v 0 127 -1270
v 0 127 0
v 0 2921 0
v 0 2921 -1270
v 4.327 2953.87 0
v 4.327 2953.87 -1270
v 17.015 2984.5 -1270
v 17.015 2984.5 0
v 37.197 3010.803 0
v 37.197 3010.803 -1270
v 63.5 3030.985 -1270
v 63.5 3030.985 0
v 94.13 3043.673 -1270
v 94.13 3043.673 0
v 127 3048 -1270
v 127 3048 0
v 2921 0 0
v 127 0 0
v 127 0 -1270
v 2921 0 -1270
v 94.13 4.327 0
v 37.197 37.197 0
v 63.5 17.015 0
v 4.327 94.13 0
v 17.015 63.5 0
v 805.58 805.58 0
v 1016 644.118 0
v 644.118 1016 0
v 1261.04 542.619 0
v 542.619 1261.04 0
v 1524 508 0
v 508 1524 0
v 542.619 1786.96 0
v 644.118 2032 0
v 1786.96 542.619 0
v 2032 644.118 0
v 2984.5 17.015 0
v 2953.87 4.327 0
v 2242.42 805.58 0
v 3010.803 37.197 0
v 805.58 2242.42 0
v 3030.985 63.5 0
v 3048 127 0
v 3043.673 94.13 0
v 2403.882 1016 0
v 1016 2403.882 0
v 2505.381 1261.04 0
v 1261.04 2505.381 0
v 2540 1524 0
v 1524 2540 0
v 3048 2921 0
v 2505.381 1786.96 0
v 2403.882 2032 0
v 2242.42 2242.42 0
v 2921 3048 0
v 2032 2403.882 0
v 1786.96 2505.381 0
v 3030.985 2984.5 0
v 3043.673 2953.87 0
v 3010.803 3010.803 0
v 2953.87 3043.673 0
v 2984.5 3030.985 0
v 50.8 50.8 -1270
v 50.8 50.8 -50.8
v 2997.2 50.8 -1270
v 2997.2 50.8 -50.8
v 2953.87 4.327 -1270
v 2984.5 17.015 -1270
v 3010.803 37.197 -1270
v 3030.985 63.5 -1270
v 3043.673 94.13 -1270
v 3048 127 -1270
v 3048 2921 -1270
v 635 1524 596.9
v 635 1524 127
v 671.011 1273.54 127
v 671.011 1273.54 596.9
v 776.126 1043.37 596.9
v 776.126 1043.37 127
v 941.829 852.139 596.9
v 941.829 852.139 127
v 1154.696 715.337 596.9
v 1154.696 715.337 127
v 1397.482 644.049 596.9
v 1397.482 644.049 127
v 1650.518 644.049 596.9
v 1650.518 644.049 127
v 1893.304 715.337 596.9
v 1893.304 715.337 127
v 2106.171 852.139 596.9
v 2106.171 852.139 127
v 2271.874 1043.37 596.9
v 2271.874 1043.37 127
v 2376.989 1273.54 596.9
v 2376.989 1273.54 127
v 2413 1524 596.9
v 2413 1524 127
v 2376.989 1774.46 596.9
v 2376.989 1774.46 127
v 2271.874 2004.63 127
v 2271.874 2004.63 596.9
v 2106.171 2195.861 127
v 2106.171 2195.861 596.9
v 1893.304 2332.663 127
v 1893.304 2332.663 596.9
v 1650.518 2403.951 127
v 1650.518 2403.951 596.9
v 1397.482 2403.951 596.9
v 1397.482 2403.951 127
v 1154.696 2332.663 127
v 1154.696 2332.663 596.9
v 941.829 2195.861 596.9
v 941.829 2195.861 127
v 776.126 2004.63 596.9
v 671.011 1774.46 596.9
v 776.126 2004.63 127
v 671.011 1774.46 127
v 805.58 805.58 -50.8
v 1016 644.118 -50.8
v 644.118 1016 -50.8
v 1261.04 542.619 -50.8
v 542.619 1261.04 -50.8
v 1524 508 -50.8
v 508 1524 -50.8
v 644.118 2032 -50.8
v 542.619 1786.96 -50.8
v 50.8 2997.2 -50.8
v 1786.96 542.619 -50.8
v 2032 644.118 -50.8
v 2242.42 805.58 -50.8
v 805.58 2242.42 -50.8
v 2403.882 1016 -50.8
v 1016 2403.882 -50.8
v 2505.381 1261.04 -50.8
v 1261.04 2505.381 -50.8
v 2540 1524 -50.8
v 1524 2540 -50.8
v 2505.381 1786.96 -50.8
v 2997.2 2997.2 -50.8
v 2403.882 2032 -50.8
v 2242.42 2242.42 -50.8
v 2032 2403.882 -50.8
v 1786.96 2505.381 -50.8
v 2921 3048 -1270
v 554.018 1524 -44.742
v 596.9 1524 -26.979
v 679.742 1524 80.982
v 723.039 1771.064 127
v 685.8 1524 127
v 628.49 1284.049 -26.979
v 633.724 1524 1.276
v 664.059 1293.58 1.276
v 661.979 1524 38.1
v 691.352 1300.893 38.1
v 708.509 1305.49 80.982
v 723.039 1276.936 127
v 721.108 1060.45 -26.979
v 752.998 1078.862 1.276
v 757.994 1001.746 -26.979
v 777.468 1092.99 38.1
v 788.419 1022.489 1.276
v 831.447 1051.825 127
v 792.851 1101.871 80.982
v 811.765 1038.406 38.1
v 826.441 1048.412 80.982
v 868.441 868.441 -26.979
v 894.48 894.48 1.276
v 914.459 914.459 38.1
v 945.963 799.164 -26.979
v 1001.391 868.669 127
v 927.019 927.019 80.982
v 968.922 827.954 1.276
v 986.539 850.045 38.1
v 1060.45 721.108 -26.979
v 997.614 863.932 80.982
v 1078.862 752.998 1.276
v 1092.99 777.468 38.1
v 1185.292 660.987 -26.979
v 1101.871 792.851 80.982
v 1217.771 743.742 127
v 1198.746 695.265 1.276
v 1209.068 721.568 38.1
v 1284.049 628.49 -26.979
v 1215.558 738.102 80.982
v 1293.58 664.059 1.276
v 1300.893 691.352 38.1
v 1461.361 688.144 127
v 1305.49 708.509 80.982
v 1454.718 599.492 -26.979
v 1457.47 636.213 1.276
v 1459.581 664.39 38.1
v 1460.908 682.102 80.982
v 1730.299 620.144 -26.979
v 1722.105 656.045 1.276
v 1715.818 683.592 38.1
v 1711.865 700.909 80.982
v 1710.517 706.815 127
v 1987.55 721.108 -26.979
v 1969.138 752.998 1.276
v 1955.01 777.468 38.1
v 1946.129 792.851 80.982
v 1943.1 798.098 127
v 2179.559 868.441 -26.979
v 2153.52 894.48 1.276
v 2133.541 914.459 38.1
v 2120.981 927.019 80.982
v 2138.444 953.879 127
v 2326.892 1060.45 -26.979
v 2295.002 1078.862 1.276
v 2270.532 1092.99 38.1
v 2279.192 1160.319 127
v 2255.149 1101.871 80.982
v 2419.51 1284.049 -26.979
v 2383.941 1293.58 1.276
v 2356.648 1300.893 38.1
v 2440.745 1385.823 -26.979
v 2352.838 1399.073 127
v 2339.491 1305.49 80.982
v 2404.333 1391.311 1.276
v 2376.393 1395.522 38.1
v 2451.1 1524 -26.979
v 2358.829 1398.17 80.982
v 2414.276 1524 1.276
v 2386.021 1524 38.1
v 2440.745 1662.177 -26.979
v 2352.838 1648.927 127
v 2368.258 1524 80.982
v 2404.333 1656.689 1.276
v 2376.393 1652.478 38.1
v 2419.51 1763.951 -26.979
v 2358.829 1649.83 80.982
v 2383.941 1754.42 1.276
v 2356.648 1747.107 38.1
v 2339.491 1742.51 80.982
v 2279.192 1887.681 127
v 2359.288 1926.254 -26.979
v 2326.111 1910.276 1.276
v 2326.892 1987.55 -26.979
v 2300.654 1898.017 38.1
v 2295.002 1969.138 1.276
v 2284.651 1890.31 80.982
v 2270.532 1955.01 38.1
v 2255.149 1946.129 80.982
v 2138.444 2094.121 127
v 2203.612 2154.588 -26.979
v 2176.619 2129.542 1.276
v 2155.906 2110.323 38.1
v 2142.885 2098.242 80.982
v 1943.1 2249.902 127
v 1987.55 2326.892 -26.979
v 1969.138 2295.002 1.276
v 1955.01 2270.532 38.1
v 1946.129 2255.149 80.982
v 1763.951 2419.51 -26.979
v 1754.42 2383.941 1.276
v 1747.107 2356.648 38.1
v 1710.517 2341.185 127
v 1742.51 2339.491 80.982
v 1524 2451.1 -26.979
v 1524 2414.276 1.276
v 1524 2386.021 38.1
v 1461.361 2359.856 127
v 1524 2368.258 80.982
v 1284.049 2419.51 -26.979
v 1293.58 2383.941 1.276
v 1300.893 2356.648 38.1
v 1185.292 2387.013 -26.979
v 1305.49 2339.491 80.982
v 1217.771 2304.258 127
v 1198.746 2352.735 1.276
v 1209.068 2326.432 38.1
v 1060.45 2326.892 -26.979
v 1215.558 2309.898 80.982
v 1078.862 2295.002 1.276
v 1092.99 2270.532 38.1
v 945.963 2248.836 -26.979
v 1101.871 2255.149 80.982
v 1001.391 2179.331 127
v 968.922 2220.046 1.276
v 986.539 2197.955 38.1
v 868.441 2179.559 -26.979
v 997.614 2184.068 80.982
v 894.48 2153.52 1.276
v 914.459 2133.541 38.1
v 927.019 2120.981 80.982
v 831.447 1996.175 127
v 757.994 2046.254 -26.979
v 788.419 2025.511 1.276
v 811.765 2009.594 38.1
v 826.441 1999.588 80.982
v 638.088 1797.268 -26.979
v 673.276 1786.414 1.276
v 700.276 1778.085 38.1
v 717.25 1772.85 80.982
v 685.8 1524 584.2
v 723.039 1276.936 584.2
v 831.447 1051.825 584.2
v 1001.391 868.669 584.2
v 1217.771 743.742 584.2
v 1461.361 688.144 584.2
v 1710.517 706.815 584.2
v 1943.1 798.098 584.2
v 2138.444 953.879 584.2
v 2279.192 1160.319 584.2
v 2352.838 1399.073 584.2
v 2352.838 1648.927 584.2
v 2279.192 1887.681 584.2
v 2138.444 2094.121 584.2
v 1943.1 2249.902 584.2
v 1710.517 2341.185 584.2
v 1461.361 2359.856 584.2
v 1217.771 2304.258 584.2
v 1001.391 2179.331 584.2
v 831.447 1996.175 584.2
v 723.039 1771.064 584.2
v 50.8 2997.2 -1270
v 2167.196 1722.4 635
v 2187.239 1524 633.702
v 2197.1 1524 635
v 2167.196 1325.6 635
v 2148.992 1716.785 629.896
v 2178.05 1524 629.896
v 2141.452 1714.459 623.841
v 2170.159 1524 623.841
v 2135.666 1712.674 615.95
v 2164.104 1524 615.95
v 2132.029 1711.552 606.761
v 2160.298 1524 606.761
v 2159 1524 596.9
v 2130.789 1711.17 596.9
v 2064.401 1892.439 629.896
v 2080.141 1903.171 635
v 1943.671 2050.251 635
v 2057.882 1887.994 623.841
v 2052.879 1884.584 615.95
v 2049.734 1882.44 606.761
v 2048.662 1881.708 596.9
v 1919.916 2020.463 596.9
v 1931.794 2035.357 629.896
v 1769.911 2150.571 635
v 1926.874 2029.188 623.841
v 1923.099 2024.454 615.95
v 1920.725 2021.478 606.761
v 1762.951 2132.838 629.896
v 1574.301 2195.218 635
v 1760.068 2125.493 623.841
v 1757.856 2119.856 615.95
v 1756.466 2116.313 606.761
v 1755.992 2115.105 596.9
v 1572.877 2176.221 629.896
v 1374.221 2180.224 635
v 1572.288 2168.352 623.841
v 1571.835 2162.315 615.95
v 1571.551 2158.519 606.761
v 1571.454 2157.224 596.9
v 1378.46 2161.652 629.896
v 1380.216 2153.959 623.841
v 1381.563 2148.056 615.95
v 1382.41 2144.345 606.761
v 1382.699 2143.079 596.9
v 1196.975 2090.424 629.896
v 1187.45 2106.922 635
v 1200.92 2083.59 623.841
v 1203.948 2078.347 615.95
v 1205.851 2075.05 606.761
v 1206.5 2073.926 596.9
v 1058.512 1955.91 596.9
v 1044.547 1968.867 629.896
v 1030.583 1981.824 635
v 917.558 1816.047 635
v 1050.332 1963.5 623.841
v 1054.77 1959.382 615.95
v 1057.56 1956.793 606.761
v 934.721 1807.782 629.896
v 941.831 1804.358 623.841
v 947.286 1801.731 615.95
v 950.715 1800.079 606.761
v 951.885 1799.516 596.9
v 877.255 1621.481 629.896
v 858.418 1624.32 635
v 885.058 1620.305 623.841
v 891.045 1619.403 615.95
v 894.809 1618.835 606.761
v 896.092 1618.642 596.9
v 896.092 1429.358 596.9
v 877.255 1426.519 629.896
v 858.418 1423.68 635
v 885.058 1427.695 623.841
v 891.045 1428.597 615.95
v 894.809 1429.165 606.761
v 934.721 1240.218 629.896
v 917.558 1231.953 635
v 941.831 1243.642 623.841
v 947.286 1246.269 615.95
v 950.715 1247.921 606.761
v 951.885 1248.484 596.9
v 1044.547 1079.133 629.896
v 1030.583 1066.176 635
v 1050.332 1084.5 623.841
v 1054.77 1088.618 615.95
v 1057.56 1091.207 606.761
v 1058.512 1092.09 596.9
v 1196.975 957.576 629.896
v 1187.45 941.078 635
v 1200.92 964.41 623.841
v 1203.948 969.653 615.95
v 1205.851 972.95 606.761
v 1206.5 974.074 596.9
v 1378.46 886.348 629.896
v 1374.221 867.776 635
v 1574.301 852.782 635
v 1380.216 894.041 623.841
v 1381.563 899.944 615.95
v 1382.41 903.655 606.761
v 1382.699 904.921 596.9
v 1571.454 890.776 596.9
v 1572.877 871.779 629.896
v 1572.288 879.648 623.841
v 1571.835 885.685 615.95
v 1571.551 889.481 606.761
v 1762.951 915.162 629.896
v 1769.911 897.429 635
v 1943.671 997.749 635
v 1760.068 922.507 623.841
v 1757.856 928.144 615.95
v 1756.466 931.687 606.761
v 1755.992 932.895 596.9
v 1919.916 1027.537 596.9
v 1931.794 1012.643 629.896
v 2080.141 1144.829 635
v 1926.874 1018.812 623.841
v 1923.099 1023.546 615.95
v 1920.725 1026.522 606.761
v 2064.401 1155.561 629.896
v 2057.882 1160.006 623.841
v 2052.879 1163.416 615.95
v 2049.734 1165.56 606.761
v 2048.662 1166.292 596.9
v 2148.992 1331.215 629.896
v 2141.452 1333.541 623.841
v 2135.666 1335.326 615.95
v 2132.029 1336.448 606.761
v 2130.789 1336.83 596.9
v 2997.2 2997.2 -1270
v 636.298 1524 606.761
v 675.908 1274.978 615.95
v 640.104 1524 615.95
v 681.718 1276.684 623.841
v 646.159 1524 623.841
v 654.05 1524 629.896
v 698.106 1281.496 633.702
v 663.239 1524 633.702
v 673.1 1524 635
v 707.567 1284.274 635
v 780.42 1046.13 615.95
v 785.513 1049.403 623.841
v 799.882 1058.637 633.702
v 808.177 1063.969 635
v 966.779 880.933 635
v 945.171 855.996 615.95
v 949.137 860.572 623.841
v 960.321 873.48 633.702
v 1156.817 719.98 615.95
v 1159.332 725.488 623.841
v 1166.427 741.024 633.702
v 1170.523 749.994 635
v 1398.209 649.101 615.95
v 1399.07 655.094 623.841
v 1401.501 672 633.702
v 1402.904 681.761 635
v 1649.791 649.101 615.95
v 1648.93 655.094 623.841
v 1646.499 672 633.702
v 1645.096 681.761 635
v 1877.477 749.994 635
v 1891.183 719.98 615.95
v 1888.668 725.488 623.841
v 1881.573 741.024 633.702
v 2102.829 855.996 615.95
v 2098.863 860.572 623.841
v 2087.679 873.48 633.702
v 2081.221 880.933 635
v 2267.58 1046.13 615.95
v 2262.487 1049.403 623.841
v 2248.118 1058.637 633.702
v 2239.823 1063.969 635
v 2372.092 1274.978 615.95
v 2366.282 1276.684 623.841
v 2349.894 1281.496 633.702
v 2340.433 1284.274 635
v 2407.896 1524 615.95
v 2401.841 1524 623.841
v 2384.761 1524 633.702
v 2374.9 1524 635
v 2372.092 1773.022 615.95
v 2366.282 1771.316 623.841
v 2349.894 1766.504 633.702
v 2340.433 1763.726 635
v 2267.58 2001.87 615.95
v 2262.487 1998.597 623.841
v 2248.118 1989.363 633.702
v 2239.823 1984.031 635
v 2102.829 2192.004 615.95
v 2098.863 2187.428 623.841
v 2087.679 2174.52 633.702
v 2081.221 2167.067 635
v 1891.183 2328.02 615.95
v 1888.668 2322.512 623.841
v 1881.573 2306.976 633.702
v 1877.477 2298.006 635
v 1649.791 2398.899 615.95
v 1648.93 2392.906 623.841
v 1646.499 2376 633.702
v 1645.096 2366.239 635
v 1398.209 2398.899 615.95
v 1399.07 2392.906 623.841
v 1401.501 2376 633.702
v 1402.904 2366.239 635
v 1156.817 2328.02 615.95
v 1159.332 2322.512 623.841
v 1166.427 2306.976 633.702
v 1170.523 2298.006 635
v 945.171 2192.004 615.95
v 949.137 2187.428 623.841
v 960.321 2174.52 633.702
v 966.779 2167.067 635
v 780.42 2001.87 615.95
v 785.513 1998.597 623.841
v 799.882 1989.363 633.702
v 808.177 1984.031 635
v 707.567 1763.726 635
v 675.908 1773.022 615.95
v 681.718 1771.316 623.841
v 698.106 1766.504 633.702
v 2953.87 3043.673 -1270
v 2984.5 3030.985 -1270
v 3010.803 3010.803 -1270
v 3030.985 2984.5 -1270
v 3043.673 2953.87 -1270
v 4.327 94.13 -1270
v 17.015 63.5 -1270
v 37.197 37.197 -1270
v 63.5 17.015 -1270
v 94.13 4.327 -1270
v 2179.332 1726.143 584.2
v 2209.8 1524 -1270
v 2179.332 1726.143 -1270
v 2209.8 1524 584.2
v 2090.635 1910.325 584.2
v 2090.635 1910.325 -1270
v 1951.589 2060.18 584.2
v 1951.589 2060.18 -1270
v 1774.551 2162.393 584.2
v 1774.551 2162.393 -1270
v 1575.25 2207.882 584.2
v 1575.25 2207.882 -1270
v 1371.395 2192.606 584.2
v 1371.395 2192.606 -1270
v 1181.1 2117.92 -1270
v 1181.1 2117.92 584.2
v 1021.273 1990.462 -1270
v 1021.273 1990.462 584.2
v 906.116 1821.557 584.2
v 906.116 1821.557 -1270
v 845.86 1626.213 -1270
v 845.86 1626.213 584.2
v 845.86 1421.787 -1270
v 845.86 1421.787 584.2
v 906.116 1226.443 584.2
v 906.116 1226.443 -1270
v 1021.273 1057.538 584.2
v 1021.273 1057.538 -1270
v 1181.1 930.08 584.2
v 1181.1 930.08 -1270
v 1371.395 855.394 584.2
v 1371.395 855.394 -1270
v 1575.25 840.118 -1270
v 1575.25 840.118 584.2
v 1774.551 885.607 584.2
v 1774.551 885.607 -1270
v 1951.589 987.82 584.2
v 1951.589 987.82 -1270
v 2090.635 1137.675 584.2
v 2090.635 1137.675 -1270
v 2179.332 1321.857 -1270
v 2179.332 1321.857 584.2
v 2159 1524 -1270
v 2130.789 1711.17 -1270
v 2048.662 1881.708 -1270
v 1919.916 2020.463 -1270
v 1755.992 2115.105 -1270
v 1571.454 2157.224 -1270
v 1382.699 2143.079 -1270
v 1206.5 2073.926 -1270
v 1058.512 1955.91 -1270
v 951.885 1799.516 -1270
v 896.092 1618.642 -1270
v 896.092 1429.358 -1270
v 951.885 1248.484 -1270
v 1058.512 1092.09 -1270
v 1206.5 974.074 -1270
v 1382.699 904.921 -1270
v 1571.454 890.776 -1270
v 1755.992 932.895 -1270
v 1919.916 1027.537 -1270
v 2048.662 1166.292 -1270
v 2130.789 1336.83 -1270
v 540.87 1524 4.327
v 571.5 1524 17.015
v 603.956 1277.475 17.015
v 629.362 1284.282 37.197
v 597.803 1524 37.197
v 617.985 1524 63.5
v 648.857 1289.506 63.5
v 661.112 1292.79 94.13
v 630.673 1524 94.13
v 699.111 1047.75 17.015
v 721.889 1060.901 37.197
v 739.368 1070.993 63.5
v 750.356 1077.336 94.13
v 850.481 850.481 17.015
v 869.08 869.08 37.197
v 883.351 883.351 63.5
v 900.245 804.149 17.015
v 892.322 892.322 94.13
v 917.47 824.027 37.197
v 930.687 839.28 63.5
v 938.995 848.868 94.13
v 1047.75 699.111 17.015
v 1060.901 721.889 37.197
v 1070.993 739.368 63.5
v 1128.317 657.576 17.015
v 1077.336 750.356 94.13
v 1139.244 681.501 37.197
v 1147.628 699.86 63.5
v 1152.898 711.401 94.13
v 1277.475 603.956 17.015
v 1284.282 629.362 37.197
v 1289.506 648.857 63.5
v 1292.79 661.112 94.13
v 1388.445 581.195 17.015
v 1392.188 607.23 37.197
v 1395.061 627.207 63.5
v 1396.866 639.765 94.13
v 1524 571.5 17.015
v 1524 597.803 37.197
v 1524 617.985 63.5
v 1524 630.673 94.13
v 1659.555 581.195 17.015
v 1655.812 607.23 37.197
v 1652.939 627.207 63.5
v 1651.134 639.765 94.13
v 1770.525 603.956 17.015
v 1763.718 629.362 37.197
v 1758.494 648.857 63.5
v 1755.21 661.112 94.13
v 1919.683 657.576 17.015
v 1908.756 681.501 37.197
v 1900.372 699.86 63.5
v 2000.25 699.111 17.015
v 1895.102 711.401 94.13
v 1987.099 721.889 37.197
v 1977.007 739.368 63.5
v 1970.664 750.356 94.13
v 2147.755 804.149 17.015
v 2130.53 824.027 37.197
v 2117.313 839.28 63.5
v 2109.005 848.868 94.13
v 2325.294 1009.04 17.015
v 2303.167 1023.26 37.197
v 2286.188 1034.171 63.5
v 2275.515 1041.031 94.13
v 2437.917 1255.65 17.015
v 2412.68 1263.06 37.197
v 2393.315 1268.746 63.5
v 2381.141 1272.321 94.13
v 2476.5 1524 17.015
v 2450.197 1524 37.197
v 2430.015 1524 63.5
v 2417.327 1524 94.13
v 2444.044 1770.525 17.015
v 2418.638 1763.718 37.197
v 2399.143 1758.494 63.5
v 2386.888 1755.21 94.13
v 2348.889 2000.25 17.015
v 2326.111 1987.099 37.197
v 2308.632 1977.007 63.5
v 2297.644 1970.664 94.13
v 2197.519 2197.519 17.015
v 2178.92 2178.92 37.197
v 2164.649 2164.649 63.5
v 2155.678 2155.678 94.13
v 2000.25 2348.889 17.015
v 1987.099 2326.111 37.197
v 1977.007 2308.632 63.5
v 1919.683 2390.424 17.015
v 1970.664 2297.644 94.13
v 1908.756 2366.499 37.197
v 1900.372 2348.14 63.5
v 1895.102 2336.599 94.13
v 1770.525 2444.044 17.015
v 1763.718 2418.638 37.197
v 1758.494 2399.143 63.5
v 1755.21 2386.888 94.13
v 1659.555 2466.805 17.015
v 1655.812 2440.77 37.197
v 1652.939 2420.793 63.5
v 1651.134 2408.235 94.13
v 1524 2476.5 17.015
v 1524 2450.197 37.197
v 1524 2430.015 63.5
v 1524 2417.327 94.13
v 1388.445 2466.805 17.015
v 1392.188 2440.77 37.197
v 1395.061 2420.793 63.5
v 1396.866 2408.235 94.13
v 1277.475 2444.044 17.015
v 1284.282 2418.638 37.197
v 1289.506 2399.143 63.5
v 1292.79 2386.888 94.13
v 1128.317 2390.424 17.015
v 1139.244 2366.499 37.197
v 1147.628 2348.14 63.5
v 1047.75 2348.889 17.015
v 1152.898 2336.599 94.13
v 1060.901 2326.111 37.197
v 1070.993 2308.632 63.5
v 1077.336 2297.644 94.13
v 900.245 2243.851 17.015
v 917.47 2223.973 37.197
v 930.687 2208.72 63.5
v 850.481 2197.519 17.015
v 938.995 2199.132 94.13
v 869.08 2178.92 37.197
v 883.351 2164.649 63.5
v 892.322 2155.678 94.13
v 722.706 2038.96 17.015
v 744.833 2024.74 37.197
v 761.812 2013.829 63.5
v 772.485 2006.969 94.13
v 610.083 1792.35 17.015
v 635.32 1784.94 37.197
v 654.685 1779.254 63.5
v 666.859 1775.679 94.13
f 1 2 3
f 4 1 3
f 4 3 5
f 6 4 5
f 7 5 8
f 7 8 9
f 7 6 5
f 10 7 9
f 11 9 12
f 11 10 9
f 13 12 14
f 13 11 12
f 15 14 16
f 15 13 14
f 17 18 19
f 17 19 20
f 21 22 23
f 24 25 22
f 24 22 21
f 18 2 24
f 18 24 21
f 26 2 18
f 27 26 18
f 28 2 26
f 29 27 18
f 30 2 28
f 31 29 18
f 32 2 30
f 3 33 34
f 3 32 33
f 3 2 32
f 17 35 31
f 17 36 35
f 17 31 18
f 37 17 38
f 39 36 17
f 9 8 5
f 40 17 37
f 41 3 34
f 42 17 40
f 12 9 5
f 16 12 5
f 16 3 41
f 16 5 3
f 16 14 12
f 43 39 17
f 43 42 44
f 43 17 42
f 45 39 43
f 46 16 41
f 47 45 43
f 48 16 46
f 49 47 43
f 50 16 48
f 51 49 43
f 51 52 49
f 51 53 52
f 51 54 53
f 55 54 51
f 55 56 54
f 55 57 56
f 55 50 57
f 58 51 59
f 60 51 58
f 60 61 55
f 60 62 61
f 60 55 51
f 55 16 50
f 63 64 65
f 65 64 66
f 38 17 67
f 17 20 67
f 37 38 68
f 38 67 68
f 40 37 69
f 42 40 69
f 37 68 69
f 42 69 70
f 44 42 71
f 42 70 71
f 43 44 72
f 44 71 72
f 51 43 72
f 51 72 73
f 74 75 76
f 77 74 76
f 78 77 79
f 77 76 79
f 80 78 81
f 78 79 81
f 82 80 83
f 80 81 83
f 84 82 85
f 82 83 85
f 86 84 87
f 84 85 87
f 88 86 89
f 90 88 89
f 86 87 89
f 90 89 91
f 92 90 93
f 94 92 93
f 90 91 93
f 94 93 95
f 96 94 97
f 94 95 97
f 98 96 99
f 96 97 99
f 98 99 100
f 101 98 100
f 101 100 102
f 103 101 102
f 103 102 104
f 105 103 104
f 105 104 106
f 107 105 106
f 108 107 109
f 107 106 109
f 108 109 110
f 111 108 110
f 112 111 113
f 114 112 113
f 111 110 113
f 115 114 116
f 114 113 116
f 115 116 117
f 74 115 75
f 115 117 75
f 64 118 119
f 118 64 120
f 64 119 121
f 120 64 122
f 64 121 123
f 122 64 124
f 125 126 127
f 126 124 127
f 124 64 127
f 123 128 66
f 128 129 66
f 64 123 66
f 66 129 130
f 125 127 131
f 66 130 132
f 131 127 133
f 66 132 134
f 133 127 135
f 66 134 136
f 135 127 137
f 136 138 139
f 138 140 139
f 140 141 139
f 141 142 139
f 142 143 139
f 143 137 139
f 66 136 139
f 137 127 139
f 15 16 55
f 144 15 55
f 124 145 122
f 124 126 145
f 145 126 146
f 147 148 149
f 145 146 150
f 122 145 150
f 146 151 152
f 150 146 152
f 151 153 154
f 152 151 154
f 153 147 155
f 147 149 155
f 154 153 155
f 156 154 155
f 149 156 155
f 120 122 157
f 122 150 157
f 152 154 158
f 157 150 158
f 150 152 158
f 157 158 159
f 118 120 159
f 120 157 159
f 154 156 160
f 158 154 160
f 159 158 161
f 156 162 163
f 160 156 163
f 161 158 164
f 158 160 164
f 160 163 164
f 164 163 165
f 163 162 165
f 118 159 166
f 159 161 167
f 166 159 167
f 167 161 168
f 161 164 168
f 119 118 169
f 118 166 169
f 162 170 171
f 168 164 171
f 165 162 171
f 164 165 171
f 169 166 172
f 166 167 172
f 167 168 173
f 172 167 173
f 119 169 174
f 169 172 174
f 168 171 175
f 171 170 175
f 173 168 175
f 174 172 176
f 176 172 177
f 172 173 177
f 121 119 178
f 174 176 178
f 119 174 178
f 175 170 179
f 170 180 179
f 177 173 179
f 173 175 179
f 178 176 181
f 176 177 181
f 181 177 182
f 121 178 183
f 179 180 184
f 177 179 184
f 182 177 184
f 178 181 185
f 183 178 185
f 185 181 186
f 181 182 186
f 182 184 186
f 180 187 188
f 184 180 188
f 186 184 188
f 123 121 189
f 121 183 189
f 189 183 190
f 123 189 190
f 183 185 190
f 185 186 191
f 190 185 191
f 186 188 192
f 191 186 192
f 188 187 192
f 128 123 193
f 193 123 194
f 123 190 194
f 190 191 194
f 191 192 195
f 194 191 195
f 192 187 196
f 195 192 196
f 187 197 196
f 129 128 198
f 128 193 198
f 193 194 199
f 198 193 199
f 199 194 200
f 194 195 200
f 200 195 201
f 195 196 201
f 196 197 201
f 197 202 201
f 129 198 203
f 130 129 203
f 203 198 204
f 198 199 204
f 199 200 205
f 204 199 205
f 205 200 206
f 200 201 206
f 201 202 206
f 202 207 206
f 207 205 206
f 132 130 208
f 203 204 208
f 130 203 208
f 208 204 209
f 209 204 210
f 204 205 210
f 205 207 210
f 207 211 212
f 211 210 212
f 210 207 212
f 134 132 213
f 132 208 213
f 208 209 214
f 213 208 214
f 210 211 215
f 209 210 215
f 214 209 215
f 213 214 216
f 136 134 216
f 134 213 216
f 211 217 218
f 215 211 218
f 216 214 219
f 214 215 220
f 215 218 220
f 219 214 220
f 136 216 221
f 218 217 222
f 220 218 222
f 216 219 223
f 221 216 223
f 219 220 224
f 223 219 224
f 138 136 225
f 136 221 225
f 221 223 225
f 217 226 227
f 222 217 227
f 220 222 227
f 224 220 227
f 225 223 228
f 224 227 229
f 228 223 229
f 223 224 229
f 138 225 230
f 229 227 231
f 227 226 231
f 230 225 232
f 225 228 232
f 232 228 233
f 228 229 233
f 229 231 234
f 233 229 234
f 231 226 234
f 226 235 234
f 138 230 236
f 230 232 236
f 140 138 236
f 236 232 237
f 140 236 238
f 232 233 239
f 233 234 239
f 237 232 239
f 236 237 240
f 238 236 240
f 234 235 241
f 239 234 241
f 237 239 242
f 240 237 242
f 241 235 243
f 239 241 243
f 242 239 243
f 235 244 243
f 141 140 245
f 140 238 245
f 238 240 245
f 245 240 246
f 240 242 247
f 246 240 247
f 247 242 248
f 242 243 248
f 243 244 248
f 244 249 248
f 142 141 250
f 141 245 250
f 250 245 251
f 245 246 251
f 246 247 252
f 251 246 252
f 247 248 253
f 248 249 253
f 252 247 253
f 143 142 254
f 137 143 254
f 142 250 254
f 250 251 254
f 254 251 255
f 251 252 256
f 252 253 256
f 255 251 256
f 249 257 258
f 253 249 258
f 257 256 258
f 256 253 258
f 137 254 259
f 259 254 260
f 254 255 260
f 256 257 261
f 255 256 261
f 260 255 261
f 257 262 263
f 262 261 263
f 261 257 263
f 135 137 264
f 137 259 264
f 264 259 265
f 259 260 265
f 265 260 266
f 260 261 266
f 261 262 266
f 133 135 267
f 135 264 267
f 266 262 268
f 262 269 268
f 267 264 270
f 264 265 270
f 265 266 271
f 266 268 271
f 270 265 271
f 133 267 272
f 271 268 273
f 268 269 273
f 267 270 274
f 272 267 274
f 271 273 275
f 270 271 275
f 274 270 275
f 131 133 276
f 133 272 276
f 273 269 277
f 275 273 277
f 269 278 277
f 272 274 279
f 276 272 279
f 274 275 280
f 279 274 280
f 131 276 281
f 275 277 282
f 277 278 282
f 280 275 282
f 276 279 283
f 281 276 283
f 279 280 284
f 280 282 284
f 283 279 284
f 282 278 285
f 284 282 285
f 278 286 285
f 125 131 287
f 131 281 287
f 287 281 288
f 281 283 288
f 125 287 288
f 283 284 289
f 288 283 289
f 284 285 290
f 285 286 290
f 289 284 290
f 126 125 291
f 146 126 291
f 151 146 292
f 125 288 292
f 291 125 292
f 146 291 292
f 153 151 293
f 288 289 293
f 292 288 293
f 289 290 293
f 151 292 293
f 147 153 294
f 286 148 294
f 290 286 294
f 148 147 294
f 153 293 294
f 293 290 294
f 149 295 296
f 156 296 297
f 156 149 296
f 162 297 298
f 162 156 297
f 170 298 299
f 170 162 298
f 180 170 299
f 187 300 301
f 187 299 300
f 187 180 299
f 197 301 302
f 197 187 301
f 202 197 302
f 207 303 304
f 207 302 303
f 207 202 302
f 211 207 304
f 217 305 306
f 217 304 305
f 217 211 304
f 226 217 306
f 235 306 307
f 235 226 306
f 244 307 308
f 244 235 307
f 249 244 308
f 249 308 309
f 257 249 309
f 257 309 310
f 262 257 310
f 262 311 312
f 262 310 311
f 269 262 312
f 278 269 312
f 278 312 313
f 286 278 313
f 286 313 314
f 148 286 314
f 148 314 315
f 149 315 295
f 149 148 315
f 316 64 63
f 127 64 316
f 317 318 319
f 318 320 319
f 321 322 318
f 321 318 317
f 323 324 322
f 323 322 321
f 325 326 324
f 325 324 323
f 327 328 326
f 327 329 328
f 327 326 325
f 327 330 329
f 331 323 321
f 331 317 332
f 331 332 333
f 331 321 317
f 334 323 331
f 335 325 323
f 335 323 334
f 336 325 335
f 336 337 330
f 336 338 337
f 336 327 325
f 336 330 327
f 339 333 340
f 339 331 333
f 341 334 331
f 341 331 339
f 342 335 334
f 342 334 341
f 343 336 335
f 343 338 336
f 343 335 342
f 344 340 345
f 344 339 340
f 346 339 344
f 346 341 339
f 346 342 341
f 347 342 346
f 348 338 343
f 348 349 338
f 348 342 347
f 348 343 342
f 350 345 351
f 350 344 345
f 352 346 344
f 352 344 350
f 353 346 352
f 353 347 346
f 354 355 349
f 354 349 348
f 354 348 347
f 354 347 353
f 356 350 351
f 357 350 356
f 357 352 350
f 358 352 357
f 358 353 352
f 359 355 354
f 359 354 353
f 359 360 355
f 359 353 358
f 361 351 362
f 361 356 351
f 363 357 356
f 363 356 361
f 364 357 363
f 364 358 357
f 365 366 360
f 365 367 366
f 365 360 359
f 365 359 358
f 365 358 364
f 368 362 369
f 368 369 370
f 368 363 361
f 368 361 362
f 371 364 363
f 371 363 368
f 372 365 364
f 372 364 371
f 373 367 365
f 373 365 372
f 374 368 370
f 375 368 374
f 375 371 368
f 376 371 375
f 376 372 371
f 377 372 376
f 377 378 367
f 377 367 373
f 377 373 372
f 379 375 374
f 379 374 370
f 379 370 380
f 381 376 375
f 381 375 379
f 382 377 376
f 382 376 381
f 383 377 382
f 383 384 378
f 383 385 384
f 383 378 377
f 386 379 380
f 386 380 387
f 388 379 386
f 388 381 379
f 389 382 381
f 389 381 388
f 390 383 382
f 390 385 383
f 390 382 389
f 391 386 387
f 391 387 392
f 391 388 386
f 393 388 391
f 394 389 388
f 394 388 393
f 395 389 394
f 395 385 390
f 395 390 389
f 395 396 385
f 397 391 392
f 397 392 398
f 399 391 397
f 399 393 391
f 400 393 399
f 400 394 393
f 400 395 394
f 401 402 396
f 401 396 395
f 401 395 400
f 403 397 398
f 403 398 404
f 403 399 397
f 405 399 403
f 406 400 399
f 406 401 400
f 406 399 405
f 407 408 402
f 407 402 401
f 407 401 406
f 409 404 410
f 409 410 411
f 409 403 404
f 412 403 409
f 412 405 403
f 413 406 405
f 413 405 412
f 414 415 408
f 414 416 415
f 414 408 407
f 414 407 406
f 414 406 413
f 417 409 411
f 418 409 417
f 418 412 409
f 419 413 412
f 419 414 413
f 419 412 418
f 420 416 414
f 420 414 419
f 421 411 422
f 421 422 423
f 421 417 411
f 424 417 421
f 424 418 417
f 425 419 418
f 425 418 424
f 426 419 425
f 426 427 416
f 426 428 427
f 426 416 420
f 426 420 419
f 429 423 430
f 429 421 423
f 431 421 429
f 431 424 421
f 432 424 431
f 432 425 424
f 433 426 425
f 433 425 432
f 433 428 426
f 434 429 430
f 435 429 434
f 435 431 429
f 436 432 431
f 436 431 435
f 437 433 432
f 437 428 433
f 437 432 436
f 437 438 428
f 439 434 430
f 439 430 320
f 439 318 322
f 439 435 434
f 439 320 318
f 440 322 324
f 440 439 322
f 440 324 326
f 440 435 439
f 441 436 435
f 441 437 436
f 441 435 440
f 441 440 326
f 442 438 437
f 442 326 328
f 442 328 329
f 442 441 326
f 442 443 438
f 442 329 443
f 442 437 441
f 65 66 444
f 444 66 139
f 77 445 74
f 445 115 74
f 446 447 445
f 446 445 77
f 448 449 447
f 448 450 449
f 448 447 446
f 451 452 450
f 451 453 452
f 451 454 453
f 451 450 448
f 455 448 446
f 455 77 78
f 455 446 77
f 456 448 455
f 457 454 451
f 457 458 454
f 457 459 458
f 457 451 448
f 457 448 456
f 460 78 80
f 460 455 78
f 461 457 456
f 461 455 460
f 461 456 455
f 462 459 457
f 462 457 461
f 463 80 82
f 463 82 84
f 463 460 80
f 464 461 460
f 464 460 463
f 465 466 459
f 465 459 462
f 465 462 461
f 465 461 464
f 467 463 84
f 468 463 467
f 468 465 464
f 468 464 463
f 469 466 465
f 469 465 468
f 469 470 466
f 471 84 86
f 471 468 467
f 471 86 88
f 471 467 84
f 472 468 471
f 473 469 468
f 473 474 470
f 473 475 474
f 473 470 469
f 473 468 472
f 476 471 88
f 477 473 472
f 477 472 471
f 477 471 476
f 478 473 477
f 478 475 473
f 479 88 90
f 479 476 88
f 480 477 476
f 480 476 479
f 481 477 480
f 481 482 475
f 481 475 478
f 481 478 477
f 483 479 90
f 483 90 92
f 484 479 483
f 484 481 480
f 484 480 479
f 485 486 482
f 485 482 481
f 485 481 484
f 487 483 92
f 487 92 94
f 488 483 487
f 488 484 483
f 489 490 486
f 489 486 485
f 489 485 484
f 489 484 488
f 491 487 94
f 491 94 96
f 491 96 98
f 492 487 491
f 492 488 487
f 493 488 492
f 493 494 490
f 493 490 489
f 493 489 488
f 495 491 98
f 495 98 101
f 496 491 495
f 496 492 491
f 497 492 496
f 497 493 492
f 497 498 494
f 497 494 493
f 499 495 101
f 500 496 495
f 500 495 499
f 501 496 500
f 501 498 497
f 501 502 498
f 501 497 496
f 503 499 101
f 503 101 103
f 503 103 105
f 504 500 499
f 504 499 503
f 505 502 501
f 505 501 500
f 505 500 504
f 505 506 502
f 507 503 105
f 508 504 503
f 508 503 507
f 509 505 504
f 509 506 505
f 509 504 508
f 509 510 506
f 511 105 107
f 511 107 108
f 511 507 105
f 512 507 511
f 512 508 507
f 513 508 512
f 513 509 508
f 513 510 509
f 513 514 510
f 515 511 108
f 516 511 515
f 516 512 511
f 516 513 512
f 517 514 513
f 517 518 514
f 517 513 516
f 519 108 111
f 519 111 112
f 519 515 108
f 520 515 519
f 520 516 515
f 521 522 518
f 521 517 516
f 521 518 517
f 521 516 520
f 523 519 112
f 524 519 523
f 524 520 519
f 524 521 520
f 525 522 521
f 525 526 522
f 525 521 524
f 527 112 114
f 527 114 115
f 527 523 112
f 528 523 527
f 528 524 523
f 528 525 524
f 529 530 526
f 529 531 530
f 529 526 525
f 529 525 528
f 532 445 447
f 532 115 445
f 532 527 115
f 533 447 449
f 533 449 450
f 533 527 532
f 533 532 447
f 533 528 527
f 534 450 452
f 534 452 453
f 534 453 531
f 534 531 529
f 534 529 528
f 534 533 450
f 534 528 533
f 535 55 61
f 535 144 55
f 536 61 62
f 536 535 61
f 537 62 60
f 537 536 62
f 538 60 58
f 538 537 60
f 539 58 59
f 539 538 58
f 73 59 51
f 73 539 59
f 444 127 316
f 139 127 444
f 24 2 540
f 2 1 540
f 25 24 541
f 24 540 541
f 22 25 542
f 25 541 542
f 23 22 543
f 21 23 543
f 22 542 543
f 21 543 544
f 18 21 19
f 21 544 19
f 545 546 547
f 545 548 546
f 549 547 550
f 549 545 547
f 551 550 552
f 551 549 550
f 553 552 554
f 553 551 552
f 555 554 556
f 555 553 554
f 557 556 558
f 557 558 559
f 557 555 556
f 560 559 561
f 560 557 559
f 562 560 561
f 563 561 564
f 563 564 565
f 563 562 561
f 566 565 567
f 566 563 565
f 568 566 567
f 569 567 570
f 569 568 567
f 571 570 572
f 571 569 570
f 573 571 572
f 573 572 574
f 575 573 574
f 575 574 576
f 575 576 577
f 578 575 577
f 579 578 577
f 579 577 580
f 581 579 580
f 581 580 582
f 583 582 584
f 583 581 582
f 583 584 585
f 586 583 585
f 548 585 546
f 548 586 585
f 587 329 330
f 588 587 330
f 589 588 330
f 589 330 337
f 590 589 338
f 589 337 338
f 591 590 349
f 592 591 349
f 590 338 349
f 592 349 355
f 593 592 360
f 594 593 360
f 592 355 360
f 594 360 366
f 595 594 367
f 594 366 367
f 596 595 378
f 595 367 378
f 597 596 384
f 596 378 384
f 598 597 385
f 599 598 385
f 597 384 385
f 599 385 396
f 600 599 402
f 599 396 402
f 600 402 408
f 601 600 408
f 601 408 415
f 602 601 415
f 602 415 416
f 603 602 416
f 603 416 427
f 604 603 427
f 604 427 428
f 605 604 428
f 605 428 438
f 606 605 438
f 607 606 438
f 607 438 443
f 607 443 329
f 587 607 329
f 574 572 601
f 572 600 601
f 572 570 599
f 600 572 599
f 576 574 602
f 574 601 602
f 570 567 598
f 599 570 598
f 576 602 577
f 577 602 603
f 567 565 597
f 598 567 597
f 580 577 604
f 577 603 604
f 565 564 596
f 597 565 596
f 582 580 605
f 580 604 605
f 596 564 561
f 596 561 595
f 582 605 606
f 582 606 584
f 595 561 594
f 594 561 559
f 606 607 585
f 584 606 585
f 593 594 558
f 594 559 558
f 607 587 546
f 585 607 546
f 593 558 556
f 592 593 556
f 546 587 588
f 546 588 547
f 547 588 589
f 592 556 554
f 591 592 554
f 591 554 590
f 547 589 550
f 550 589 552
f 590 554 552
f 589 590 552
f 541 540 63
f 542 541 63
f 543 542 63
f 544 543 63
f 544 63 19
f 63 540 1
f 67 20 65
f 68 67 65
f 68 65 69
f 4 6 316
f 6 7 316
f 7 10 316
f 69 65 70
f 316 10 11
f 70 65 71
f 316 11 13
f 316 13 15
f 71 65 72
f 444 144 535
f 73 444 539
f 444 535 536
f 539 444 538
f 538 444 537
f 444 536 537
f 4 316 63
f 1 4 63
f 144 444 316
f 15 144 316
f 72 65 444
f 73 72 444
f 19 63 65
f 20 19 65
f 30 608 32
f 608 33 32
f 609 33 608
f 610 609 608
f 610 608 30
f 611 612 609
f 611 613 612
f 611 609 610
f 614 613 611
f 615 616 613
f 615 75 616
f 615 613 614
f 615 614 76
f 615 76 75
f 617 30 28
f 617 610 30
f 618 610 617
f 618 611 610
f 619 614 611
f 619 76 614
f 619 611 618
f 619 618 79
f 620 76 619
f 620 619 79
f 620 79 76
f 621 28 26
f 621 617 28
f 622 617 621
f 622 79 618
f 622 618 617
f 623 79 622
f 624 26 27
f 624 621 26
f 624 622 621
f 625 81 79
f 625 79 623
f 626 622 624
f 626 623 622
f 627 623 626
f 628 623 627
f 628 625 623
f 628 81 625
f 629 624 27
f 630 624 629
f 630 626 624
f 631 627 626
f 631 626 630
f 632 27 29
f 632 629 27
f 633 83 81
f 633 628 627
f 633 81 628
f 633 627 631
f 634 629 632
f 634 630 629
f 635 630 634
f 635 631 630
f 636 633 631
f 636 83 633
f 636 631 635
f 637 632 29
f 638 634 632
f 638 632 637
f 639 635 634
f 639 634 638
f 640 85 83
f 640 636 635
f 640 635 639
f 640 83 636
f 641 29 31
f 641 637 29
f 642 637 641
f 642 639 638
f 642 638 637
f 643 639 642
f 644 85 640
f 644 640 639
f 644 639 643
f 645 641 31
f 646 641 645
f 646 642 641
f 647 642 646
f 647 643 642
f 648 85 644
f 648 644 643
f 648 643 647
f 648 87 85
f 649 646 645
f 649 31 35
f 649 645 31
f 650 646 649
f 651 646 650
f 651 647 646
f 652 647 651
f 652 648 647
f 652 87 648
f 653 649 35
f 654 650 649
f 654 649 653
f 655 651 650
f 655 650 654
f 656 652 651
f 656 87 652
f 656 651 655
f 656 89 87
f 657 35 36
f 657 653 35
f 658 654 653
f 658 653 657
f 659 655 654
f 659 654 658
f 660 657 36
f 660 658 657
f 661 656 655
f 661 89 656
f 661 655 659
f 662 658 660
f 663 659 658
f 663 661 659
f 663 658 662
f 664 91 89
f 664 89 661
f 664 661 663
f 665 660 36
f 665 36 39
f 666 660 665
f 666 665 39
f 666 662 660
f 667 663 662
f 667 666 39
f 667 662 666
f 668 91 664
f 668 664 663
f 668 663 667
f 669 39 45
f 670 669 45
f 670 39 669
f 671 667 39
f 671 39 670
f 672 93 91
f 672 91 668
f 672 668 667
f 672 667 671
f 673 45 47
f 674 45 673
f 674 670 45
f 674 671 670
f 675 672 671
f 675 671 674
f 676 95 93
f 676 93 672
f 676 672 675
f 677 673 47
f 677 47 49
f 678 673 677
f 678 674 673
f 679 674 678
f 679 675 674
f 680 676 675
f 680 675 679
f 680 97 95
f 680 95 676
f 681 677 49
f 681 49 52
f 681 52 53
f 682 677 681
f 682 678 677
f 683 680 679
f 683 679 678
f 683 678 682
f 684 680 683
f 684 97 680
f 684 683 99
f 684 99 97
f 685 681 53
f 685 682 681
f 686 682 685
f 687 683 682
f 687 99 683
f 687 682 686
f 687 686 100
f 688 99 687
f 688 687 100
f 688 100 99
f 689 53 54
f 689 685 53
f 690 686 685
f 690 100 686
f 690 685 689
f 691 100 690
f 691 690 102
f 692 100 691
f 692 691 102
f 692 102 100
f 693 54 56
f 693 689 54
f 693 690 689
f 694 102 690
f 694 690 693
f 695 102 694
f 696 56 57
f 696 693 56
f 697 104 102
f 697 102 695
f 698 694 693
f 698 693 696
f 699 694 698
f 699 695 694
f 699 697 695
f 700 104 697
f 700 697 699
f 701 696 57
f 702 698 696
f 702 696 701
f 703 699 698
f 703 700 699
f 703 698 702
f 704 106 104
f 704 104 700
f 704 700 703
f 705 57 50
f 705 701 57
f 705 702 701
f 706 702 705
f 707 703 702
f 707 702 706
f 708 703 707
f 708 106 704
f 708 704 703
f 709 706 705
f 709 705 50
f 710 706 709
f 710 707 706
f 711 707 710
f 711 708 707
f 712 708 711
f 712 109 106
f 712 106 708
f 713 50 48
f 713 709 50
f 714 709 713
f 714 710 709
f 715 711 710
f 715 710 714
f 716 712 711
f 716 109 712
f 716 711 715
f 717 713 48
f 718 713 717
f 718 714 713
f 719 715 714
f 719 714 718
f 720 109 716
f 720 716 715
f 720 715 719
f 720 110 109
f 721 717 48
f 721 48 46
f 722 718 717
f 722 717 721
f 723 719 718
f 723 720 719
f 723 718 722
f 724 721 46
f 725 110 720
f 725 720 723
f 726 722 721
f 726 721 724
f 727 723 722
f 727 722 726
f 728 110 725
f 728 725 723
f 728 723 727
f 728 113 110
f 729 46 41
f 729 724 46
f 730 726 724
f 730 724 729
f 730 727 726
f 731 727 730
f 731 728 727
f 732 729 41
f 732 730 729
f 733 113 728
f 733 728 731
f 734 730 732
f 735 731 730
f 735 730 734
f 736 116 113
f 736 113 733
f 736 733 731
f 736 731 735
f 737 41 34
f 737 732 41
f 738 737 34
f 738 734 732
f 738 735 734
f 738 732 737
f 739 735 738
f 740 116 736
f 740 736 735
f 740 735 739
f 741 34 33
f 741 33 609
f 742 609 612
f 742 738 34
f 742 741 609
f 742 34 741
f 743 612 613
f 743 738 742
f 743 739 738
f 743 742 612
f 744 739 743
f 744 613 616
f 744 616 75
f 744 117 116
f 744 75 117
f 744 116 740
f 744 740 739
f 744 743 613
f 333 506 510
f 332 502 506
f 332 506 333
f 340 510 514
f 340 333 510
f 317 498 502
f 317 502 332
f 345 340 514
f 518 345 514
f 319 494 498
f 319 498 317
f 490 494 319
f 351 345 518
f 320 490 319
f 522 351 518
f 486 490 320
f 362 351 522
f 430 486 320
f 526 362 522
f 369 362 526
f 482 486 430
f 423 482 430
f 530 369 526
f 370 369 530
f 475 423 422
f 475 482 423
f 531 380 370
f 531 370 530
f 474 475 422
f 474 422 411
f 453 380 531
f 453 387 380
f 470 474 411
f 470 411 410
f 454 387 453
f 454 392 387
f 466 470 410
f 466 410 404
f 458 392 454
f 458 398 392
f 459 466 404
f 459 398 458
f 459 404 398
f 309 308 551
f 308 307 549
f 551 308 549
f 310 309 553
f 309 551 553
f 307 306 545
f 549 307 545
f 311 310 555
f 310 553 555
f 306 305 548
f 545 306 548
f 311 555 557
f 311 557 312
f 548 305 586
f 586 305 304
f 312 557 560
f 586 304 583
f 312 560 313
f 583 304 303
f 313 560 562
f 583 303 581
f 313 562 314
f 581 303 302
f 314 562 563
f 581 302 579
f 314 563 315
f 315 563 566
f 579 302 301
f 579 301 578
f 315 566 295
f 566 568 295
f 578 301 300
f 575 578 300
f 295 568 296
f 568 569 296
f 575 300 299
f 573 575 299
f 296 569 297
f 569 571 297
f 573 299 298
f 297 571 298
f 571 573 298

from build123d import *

# Parameters (mm, degrees)
SKETCH1_W           = 3048
SKETCH1_H           = 3048
BOSS_EXTRUDE1_DEPTH = 1270
SKETCH3_R           = 889
BOSS_EXTRUDE2_DEPTH = 635
SKETCH8_R           = 635
CUT_EXTRUDE1_DEPTH  = 4713.709730081
FILLET11_R          = 127
FILLET12_R          = 38.1
SHELL1_T            = -50.8
FILLET13_R          = 127


with BuildPart() as part:
    # Sketch1 → Boss-Extrude1 (new body)
    with BuildSketch(Plane.XY):
        with Locations((1524, 1524)):
            Rectangle(SKETCH1_W, SKETCH1_H)
    extrude(amount=-BOSS_EXTRUDE1_DEPTH)

    # Sketch3 → Boss-Extrude2 (add)
    with BuildSketch(Plane.XY):
        with Locations(Location((1524, 1524, 0), (0, 0, 180))):
            Circle(SKETCH3_R)
    extrude(amount=BOSS_EXTRUDE2_DEPTH)

    # Sketch8 → Cut-Extrude1 (cut, through all)
    with BuildSketch(Plane.XY.offset(635)):
        with Locations((1524, 1524)):
            Circle(SKETCH8_R)
    extrude(amount=-CUT_EXTRUDE1_DEPTH, mode=Mode.SUBTRACT)

    # Fillet11
    fillet11_edges = [part.edges().sort_by_distance(p)[0] for p in [
        (2413, 1524, 0),
    ]]
    fillet(fillet11_edges, radius=FILLET11_R)

    # Fillet12
    fillet12_edges = [part.edges().sort_by_distance(p)[0] for p in [
        (2413, 1524, 635),
        (889, 1524, 635),
    ]]
    fillet(fillet12_edges, radius=FILLET12_R)

    # Shell1
    shell1_openings = [part.faces().sort_by_distance(p)[0] for p in [
        (1524, 43.105229381, -1270),
    ]]
    offset(amount=SHELL1_T, openings=shell1_openings, kind=Kind.INTERSECTION)

    # Fillet13
    fillet13_edges = [part.edges().sort_by_distance(p)[0] for p in [
        (0, 0, -635),
        (3048, 0, -635),
        (3048, 3048, -635),
        (0, 3048, -635),
    ]]
    fillet(fillet13_edges, radius=FILLET13_R)


solid = part.part
